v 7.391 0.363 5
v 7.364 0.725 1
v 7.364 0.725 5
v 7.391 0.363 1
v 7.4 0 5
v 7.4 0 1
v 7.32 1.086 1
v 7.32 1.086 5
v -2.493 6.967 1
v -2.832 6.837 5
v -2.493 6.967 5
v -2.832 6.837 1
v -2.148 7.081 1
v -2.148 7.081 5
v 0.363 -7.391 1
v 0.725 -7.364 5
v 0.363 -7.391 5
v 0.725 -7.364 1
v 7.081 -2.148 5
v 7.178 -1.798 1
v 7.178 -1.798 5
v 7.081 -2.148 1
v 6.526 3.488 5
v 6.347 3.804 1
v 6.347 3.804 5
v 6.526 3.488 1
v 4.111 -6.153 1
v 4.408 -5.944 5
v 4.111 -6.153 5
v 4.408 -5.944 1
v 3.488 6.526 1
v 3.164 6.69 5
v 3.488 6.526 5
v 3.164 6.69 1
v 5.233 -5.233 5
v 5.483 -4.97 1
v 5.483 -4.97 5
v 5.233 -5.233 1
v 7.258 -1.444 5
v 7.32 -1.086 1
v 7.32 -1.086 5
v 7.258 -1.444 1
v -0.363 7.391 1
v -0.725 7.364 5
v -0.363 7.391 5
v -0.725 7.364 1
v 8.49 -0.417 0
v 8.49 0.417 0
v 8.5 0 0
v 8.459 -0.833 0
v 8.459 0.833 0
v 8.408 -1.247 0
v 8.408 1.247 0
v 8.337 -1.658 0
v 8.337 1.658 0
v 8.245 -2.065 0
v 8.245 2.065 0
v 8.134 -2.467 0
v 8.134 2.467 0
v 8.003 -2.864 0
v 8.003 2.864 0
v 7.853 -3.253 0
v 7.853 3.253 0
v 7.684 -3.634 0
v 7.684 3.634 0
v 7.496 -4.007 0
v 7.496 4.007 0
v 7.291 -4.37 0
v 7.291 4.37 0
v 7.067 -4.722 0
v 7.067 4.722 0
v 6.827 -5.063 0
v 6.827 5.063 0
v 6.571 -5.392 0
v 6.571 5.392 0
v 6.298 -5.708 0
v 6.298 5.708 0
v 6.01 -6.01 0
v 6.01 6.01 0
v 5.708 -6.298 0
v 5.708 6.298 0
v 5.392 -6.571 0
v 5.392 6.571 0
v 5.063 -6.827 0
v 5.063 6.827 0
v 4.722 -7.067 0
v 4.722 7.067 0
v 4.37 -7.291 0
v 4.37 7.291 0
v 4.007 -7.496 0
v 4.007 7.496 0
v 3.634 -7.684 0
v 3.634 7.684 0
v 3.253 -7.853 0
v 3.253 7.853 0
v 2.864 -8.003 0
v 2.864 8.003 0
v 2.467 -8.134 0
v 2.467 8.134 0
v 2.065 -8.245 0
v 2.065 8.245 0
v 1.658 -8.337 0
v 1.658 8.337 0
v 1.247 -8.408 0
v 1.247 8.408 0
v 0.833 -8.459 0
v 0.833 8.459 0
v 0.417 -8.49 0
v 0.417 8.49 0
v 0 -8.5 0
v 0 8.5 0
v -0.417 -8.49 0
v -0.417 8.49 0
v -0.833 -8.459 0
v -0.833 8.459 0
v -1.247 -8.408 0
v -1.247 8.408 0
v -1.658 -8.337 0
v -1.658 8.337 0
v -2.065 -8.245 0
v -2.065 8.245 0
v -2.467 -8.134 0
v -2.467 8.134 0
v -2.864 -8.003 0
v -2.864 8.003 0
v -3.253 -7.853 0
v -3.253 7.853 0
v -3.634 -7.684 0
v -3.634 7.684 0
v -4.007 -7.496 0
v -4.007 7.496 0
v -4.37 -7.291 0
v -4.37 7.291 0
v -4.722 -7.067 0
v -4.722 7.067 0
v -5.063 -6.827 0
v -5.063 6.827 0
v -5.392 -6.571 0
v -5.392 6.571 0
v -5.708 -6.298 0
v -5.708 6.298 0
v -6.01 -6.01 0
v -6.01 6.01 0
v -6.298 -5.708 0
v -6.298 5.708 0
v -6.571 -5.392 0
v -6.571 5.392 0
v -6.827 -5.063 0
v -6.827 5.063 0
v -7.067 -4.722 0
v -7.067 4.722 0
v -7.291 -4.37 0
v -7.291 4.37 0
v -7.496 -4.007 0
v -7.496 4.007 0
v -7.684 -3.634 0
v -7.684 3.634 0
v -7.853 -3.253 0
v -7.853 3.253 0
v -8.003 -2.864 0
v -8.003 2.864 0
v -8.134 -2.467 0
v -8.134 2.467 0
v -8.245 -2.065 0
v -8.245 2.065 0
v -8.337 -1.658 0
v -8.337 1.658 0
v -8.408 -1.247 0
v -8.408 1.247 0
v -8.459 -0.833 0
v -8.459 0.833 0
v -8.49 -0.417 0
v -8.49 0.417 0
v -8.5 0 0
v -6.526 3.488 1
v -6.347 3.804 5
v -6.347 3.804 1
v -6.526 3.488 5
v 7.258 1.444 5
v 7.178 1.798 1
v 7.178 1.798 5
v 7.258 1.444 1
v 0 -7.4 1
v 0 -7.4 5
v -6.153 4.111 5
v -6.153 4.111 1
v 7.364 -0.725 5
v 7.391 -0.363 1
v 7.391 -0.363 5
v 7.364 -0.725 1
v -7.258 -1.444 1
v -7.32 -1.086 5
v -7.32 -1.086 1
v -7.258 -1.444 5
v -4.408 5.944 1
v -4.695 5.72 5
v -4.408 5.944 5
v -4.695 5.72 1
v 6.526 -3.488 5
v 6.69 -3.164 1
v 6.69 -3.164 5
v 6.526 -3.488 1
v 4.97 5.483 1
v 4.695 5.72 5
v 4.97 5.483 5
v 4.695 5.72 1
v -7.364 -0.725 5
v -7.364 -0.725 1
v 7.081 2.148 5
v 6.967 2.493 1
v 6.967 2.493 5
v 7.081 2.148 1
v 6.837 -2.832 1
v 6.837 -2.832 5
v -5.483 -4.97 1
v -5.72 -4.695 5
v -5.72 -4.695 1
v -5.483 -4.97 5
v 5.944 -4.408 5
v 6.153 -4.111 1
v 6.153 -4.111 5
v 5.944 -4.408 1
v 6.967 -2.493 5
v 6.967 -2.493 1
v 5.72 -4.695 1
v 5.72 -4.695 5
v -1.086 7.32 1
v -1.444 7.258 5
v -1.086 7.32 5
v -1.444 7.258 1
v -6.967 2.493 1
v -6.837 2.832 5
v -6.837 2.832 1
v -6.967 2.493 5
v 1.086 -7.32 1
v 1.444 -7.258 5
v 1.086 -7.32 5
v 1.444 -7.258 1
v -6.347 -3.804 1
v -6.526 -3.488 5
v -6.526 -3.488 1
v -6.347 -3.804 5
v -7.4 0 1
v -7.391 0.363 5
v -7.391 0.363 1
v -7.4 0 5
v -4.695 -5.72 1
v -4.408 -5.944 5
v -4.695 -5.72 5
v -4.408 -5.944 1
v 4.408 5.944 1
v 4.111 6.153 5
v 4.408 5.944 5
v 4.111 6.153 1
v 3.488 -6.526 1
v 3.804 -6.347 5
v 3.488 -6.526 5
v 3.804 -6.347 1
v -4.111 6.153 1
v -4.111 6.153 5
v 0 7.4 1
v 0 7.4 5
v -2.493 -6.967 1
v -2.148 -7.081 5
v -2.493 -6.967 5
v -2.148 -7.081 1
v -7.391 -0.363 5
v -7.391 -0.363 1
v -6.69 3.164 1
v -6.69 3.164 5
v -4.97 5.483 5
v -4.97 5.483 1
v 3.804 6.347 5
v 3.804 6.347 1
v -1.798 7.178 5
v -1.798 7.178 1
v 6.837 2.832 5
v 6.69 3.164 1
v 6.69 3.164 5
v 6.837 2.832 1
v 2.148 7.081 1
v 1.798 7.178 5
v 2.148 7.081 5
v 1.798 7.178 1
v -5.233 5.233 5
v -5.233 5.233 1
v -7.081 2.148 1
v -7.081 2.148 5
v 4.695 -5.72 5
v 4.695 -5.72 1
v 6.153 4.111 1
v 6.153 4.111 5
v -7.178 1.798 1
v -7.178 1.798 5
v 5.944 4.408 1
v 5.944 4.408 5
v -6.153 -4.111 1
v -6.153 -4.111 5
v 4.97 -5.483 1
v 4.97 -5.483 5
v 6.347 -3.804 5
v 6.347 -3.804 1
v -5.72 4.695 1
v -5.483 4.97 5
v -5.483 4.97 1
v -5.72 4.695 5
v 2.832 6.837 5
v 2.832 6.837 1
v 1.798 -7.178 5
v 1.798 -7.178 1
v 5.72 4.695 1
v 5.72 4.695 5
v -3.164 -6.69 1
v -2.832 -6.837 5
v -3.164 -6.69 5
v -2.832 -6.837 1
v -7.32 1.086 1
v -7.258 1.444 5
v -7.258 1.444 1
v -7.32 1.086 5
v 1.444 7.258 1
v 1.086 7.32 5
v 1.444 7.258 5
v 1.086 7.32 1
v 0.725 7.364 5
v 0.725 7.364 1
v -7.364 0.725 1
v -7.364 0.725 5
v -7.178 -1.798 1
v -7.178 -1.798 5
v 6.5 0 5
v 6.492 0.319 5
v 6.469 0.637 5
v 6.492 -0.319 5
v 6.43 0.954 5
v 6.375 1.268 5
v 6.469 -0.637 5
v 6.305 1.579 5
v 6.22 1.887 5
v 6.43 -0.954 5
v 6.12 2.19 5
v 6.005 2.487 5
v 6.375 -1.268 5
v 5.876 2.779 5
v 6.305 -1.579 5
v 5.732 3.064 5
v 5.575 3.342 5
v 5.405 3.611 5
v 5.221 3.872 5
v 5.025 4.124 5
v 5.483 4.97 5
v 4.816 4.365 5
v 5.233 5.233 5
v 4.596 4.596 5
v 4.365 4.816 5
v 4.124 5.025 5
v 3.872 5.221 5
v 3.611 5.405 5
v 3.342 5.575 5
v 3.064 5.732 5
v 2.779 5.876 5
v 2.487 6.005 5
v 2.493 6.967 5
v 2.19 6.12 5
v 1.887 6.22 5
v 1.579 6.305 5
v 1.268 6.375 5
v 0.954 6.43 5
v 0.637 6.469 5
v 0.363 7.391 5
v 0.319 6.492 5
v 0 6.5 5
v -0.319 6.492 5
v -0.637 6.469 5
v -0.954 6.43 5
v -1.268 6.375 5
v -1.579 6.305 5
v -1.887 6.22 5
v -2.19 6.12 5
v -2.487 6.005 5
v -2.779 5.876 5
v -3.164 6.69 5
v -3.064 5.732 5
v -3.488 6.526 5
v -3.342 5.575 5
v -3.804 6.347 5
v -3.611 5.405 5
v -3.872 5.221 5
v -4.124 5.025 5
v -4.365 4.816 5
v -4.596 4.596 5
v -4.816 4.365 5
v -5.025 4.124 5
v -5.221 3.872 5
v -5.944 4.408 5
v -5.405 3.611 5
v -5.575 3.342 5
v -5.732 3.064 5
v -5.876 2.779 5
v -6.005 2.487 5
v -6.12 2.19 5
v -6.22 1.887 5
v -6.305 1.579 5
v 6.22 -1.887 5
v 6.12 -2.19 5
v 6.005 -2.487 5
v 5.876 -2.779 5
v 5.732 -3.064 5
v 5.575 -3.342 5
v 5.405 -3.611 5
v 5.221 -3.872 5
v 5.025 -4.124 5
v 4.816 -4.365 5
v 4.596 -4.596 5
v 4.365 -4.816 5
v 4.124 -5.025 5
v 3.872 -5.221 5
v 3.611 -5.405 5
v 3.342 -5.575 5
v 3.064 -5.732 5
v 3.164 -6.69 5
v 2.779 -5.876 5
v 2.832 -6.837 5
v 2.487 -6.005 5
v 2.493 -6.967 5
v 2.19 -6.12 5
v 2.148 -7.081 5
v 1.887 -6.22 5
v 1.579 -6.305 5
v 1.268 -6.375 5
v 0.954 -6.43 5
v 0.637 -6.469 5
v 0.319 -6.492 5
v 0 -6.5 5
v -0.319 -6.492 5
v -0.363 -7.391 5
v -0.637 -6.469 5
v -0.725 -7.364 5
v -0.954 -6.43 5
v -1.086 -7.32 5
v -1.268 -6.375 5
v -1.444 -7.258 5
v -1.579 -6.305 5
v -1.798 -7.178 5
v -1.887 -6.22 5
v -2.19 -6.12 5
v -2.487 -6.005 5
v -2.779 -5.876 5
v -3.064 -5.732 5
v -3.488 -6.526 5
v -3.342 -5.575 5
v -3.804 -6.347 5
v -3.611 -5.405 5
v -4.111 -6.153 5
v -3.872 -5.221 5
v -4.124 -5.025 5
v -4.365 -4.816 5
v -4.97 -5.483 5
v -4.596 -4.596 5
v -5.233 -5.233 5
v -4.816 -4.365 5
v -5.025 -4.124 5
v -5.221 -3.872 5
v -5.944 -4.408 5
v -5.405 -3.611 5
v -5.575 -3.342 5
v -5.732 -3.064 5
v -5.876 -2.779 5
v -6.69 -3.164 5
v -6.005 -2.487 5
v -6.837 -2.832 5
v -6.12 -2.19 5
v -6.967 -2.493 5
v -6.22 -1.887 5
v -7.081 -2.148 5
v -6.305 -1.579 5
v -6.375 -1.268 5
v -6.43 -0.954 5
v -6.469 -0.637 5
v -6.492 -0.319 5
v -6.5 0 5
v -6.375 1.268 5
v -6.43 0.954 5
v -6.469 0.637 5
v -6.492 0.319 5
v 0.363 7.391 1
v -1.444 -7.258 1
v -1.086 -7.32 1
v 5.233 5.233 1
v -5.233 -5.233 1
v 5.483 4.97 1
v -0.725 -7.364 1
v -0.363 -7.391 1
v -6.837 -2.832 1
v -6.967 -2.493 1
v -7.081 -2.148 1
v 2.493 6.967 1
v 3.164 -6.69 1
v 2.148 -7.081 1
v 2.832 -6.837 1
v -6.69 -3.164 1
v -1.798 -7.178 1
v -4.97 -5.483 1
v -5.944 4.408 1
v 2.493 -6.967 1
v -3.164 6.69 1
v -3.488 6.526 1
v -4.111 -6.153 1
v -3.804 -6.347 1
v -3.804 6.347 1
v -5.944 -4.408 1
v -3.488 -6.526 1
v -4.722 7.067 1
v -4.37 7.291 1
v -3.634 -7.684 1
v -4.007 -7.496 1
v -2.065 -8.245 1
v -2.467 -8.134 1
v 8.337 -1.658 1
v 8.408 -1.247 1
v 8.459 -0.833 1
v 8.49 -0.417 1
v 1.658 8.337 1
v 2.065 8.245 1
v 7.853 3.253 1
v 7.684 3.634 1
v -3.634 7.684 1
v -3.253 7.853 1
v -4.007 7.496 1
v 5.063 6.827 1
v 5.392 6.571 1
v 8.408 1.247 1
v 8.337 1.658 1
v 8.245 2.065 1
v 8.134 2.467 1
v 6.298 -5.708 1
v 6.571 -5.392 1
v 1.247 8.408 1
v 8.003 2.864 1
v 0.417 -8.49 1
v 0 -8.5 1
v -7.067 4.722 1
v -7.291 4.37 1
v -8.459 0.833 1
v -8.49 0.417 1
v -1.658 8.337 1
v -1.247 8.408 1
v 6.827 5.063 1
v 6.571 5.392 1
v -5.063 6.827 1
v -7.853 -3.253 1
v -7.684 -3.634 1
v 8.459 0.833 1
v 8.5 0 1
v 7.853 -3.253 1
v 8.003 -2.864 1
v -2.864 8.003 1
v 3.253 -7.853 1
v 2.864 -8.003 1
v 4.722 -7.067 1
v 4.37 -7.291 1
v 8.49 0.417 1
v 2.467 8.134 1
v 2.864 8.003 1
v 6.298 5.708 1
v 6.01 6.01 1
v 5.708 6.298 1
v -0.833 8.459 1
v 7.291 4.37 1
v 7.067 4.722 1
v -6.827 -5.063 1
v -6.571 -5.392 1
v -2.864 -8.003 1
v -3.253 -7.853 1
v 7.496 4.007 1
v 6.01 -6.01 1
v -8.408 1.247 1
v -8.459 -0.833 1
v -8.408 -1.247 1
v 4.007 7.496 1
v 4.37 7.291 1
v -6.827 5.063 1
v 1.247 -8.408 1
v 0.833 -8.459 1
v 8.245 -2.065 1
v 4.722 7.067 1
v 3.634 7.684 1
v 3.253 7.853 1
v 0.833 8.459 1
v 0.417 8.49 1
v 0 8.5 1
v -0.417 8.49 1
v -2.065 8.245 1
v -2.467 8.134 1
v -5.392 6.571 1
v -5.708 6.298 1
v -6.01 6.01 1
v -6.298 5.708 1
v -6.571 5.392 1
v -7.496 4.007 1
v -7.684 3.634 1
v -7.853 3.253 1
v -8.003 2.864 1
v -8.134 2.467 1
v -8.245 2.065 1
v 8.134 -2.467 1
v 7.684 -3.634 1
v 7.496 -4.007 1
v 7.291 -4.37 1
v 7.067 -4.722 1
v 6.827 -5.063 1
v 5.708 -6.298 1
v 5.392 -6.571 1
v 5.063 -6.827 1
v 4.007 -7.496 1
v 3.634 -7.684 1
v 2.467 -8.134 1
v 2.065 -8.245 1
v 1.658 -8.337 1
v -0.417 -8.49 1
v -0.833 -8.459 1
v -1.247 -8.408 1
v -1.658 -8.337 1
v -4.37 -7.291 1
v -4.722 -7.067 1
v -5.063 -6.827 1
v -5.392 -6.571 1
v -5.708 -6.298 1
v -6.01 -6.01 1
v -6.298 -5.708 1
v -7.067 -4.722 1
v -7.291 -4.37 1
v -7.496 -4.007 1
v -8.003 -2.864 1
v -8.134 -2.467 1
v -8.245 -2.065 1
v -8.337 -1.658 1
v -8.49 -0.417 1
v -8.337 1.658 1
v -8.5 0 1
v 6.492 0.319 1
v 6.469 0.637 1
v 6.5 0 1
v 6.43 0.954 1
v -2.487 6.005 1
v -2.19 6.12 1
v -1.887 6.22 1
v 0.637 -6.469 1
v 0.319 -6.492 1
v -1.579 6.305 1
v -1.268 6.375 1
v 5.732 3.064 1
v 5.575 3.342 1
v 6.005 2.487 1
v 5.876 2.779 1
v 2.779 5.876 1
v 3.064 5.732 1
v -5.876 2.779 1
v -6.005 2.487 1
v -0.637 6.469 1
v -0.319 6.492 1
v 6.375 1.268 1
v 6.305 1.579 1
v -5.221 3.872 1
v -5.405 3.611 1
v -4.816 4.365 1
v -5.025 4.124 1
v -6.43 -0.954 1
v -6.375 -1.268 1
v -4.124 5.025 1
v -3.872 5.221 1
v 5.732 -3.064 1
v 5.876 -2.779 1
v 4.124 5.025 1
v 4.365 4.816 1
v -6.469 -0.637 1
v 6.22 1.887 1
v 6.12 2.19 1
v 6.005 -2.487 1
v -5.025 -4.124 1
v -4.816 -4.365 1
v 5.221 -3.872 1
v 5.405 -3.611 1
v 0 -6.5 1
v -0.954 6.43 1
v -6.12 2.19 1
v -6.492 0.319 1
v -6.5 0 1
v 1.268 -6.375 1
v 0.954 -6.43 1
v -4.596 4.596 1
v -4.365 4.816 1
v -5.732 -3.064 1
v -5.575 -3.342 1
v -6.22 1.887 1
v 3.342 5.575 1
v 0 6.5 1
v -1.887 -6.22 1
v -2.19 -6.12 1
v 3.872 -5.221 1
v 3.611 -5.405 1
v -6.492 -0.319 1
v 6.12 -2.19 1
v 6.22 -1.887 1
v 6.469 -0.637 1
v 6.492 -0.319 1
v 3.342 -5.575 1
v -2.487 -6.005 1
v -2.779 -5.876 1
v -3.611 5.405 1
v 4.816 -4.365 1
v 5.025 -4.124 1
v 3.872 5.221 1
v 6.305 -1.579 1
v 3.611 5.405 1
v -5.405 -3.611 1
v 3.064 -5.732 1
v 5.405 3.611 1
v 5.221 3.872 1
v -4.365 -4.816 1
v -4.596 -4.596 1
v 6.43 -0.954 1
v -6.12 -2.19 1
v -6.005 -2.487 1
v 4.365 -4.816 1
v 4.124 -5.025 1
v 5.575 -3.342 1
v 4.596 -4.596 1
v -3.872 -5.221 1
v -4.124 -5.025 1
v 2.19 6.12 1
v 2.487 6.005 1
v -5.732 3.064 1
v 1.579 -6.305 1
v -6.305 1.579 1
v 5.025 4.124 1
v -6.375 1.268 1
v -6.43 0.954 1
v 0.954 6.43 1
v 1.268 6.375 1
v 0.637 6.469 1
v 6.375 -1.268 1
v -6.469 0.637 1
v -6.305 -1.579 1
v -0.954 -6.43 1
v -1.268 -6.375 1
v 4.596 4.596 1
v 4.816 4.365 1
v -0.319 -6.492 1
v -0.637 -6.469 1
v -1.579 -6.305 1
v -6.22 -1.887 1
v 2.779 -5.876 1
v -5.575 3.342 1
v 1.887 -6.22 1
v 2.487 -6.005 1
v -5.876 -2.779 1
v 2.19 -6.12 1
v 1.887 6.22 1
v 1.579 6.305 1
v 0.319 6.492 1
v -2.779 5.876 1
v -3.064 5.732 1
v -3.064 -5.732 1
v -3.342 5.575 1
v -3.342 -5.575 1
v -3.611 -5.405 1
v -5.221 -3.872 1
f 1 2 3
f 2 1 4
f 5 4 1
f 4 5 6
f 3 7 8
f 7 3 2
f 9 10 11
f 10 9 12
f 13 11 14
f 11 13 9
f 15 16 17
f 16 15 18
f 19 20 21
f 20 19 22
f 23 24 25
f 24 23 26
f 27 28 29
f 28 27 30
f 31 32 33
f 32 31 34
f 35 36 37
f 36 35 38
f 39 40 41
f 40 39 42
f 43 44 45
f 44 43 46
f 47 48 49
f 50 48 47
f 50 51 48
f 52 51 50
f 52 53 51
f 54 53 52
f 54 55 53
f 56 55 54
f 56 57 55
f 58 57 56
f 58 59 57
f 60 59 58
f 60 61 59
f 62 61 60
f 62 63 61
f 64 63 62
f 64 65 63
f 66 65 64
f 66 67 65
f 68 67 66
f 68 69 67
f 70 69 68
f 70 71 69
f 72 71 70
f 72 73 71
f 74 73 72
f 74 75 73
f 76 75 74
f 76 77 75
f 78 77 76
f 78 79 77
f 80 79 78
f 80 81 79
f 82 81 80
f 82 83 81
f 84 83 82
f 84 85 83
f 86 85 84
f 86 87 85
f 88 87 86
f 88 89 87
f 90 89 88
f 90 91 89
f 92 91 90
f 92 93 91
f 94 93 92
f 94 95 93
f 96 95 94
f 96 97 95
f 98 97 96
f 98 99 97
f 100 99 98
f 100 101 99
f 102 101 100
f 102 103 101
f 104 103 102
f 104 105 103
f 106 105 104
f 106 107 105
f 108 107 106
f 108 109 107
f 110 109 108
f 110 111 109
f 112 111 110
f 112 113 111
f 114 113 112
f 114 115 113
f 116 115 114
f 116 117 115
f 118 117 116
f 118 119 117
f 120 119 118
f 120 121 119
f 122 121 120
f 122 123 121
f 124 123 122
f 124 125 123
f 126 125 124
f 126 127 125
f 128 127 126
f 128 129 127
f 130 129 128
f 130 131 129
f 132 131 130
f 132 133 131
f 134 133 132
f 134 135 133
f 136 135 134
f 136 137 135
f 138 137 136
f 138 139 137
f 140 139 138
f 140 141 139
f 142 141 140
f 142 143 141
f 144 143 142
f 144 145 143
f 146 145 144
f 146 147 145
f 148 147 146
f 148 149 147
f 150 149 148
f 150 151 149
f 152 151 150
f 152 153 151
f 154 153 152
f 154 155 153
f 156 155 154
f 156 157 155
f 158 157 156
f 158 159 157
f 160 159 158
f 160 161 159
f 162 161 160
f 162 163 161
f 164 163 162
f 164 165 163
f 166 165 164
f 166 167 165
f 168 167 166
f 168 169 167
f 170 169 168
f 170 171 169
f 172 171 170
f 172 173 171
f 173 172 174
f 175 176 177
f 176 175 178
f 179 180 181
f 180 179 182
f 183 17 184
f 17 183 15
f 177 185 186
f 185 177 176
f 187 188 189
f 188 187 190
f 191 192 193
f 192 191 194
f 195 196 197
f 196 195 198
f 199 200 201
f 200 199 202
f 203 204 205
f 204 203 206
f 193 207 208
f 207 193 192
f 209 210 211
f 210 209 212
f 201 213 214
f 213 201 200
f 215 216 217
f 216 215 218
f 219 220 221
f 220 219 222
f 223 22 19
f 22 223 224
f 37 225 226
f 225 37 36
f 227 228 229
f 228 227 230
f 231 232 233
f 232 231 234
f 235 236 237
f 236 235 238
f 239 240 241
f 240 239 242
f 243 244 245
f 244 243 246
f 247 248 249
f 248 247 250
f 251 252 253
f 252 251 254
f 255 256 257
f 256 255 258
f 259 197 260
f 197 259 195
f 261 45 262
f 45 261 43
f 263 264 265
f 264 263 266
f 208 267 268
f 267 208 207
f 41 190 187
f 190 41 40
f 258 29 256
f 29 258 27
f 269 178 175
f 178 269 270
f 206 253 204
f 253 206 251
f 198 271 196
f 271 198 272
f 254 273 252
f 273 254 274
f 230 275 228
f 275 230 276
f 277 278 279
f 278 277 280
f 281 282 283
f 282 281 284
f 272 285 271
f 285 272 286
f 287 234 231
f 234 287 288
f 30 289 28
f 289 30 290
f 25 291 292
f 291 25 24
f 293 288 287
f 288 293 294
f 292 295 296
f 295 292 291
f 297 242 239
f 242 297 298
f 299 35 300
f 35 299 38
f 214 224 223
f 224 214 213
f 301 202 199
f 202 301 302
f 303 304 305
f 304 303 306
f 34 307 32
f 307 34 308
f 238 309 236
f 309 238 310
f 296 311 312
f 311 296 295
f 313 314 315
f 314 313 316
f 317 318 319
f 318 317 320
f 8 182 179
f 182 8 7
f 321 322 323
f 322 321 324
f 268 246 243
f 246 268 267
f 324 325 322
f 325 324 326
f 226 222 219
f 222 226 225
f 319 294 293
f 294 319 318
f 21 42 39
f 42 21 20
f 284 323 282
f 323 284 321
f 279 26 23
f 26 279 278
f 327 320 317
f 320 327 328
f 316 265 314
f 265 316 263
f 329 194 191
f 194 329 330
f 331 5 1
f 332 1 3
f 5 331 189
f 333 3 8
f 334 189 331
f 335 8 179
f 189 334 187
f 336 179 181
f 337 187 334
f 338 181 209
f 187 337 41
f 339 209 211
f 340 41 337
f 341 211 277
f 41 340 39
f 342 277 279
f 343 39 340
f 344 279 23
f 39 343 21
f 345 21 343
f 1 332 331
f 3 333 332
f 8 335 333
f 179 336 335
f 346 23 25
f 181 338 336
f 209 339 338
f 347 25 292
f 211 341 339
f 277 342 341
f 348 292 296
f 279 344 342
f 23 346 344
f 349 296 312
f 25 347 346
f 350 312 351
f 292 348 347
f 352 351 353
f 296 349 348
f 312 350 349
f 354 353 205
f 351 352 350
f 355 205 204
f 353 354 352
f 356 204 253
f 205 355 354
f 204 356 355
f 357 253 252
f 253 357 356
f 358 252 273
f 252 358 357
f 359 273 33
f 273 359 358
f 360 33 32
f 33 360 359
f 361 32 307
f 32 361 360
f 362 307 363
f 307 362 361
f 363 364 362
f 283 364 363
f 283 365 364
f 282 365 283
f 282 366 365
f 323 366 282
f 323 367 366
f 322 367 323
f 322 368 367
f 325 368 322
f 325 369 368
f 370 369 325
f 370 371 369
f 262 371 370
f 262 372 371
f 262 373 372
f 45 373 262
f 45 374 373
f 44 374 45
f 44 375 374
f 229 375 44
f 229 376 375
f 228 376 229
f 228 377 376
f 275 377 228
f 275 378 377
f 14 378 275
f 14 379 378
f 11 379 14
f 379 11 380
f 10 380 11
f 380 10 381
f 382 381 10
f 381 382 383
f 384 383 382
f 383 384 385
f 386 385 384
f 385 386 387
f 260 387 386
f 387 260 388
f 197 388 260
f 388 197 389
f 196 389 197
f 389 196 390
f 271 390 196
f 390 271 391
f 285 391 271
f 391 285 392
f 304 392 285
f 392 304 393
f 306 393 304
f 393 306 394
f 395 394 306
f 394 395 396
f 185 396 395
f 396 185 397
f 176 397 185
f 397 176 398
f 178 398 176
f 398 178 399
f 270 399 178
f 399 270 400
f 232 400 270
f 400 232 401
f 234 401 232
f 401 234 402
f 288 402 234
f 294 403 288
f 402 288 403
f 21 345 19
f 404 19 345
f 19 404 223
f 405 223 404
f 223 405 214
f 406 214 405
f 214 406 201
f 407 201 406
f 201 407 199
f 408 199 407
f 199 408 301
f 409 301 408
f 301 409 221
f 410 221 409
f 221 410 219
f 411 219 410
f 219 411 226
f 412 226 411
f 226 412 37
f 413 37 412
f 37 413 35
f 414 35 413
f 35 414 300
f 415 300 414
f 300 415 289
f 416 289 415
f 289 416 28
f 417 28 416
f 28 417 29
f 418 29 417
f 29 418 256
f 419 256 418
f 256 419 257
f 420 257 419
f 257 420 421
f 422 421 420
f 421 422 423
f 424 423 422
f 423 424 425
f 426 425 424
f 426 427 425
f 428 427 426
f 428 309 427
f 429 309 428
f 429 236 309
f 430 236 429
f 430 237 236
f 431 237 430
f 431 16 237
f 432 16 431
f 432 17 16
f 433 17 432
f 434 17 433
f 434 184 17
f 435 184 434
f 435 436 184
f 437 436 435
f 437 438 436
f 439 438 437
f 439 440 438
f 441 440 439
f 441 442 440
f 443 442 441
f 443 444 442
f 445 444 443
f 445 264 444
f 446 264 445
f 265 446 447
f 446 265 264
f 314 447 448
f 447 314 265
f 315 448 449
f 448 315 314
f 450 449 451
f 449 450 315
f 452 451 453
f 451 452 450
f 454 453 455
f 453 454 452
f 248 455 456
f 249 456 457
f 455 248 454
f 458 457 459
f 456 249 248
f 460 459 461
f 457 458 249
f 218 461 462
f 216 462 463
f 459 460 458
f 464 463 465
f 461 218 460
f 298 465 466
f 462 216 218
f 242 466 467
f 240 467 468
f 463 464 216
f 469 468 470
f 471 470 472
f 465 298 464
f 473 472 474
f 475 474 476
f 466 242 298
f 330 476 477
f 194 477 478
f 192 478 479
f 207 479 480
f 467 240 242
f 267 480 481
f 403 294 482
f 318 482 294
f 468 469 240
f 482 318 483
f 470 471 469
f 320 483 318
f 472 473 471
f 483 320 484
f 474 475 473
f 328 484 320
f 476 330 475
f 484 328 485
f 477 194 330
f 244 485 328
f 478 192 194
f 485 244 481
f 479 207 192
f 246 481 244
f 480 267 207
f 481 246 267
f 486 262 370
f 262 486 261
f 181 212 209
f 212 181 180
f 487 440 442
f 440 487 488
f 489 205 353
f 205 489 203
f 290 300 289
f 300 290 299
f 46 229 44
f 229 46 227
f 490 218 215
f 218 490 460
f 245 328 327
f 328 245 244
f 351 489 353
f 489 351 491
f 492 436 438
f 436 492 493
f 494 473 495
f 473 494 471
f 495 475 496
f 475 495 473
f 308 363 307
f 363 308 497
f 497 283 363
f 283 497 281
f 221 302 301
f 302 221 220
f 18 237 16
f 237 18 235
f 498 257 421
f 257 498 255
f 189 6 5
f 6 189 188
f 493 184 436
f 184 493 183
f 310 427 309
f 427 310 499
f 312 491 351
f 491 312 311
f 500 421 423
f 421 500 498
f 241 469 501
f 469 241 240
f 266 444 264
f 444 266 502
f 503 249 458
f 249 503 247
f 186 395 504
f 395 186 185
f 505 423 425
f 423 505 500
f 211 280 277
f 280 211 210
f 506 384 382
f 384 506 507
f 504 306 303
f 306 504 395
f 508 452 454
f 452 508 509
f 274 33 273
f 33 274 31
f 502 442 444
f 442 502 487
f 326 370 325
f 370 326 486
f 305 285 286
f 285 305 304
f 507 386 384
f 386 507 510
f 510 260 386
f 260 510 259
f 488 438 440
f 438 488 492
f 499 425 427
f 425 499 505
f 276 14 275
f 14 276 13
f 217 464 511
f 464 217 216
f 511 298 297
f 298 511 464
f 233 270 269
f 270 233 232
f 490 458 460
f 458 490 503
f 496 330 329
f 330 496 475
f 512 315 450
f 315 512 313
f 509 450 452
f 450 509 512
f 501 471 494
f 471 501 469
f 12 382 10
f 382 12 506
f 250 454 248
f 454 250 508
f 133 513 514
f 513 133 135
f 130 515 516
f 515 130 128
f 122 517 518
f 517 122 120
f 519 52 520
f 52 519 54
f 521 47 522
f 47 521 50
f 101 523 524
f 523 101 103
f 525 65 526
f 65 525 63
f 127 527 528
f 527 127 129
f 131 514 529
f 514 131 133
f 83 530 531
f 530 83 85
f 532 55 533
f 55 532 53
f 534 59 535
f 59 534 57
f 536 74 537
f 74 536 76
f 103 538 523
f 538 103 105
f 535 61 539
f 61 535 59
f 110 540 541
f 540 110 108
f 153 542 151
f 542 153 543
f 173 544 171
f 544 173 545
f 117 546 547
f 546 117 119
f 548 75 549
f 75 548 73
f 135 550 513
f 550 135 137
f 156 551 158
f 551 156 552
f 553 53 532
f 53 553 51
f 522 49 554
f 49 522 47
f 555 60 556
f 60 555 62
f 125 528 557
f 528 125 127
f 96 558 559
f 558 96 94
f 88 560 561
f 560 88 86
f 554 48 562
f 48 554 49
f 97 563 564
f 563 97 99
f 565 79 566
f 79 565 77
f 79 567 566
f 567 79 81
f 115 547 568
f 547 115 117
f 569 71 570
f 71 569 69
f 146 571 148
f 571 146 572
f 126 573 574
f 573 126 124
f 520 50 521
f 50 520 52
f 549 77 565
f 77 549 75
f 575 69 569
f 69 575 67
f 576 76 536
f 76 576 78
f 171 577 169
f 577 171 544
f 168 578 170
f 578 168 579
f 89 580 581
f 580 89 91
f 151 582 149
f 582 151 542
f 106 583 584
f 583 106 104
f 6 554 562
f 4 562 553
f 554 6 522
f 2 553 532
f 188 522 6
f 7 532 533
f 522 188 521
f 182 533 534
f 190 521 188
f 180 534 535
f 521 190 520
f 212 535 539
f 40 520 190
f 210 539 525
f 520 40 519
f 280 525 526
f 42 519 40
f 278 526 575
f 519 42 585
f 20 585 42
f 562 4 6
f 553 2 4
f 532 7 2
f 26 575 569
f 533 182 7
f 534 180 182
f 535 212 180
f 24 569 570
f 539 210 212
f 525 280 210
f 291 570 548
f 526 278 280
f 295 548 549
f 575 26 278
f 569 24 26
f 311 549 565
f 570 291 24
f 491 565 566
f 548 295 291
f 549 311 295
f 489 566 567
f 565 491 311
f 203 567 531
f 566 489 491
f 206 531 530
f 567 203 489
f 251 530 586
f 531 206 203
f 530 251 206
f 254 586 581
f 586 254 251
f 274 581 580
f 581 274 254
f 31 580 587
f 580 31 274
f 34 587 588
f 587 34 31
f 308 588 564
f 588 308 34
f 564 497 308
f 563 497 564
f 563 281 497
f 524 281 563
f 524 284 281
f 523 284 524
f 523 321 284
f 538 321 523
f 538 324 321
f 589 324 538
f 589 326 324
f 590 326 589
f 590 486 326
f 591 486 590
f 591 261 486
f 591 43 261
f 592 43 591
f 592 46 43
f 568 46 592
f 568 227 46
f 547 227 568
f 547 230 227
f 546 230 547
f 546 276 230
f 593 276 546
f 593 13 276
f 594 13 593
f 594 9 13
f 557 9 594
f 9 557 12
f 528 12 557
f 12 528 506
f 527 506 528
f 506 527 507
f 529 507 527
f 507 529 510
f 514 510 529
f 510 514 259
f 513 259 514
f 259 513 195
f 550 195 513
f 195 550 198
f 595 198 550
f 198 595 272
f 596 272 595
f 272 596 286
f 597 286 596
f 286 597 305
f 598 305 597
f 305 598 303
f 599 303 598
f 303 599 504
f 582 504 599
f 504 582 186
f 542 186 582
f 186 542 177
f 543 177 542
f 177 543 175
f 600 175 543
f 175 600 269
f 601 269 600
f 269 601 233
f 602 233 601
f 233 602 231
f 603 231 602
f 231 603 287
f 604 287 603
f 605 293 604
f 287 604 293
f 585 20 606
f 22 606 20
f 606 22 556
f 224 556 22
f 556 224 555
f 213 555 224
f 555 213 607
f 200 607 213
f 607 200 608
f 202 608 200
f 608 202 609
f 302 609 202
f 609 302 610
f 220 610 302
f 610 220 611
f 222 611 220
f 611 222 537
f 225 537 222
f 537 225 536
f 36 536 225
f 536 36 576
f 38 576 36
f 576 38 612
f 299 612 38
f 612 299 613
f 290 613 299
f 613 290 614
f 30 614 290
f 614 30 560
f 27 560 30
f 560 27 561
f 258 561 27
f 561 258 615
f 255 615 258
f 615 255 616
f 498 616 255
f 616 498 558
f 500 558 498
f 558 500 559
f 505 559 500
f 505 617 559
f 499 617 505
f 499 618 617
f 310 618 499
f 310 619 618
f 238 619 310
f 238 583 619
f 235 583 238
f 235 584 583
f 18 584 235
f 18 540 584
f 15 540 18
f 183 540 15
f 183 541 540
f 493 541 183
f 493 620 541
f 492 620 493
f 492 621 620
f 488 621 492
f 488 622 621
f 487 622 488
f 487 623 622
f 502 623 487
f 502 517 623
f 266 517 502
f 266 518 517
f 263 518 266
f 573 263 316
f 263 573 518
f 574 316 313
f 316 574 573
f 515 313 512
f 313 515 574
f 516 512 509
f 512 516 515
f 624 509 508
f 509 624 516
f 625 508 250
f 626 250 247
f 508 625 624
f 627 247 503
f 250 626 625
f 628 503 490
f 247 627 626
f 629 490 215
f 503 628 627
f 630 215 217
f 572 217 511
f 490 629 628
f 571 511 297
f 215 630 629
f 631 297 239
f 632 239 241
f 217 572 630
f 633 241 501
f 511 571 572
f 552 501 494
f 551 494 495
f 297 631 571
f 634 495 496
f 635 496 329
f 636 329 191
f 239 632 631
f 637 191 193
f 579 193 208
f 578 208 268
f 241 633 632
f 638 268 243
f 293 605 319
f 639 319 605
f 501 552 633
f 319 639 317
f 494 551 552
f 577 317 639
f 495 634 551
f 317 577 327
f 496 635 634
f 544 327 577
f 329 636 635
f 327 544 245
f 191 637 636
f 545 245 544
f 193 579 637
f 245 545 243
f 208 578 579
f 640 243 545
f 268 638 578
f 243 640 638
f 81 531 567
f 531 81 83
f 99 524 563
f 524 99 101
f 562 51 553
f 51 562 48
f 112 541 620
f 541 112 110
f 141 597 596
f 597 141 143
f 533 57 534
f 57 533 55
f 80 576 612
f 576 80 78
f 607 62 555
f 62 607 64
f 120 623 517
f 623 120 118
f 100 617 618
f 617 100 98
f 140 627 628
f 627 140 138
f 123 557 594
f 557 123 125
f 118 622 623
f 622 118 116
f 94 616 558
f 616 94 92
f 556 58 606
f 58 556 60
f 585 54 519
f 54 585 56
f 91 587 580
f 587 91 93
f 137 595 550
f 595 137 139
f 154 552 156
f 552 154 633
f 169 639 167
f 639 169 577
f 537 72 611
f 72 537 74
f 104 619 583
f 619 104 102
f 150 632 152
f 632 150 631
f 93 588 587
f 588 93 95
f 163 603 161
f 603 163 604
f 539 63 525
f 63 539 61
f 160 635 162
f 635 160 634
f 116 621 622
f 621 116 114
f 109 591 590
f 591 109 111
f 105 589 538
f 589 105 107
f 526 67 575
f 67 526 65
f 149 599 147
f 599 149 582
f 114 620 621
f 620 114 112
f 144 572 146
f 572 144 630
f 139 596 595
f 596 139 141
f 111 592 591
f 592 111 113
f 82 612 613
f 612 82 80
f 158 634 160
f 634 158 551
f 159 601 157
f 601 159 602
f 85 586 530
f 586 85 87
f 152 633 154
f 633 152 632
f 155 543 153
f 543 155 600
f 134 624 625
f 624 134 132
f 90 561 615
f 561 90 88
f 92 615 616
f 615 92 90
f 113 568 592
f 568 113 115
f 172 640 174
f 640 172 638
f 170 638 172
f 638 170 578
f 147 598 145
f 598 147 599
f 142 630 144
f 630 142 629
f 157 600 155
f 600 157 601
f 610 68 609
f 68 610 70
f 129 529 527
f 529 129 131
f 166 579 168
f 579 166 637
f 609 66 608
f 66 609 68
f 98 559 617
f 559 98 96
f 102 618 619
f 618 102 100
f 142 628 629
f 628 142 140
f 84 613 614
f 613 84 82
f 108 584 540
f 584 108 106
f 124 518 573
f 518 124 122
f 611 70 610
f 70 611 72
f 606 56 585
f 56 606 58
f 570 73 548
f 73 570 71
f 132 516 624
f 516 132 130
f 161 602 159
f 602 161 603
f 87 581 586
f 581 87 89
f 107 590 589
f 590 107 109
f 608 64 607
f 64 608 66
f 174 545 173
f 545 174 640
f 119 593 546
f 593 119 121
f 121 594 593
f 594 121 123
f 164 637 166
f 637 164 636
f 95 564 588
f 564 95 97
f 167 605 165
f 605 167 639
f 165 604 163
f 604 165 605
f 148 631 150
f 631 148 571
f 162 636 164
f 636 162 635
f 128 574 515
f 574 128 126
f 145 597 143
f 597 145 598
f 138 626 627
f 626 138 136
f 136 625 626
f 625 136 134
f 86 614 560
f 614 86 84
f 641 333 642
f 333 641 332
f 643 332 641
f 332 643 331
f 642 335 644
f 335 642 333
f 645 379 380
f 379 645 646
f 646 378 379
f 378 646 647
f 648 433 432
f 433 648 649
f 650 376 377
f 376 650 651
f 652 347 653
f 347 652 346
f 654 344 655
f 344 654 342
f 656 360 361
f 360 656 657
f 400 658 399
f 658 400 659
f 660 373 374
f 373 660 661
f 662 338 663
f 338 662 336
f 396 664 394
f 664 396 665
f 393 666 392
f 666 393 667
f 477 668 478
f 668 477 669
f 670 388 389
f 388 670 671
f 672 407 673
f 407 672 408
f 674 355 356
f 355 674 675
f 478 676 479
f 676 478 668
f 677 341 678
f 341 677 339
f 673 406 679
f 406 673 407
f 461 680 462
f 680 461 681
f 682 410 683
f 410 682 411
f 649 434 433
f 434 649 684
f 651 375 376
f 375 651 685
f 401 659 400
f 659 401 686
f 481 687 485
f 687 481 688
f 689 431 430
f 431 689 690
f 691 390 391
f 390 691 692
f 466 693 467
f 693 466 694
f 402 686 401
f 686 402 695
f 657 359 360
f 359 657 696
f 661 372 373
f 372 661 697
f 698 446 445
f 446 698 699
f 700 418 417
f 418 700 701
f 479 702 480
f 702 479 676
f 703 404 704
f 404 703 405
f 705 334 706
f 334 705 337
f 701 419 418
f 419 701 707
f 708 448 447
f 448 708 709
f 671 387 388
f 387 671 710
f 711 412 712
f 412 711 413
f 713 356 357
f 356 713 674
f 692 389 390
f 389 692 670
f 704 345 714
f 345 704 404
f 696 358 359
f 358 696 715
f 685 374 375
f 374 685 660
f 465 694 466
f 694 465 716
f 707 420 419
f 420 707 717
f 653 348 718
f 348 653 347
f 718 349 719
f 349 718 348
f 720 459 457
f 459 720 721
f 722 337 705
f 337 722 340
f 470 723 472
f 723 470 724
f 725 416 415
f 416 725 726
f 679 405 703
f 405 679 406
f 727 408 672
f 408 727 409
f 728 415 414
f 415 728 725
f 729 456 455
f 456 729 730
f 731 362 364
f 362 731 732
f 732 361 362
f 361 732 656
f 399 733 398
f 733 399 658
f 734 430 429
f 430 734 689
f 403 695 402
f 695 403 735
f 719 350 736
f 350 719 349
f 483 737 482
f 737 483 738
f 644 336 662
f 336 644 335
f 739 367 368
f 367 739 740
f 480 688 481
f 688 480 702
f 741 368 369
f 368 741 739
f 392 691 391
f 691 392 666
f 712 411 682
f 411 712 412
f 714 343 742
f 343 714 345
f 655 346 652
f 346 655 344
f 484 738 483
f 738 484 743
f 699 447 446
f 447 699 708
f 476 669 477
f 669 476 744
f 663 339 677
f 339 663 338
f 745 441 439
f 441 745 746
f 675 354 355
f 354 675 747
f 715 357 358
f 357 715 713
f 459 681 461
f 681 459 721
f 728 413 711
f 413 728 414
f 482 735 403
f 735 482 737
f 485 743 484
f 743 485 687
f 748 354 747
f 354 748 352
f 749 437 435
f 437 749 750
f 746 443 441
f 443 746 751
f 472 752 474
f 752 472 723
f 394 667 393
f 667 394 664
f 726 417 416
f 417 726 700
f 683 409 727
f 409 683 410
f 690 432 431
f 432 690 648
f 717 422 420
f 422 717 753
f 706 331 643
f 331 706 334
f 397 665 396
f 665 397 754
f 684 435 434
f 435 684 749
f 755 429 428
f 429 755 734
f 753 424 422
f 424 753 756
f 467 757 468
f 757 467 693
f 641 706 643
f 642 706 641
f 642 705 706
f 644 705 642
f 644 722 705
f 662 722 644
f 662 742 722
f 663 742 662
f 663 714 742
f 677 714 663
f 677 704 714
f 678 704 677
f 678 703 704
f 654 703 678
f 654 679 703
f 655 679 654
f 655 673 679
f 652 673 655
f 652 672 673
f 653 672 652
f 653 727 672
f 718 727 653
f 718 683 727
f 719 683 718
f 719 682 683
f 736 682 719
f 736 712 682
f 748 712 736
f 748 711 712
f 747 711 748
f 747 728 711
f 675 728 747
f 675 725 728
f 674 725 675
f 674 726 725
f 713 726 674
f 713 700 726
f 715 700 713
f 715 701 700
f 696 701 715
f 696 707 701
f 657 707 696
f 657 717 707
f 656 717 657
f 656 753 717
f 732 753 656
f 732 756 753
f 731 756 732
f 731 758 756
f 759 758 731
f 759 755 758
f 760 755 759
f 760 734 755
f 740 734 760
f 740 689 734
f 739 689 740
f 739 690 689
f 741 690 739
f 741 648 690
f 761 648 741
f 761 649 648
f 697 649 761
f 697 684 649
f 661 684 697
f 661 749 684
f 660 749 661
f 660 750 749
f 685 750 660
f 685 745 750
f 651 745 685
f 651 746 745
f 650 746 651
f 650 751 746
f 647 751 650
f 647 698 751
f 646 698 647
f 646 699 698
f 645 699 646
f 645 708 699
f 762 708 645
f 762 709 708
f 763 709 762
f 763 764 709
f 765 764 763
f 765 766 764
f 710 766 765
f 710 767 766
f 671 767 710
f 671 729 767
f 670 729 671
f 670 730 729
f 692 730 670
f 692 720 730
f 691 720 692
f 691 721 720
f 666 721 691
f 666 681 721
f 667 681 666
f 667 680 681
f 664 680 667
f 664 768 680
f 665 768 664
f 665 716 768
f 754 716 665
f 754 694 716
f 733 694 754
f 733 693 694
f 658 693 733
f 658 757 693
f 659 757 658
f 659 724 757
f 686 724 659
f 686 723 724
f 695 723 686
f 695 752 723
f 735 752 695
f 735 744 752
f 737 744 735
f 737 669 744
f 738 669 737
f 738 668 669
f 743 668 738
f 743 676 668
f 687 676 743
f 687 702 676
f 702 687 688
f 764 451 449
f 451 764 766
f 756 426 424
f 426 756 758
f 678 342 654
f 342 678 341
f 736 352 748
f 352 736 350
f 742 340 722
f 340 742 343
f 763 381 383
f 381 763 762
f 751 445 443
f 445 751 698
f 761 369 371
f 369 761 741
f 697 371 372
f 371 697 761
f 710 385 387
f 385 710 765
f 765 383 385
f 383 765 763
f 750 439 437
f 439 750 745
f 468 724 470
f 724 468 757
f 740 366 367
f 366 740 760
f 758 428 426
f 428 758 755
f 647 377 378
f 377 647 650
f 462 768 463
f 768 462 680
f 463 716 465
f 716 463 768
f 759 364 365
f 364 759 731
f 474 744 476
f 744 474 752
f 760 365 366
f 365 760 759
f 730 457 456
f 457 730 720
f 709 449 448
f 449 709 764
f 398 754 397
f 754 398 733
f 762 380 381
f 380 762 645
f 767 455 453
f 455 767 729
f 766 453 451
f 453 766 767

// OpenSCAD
$fn=128;
difference(){
union(){
  cylinder(d=14.8,h=5);
  cylinder(d=17,h=1);

}
translate([0,0,1]) cylinder(d=13,h=4);
}
